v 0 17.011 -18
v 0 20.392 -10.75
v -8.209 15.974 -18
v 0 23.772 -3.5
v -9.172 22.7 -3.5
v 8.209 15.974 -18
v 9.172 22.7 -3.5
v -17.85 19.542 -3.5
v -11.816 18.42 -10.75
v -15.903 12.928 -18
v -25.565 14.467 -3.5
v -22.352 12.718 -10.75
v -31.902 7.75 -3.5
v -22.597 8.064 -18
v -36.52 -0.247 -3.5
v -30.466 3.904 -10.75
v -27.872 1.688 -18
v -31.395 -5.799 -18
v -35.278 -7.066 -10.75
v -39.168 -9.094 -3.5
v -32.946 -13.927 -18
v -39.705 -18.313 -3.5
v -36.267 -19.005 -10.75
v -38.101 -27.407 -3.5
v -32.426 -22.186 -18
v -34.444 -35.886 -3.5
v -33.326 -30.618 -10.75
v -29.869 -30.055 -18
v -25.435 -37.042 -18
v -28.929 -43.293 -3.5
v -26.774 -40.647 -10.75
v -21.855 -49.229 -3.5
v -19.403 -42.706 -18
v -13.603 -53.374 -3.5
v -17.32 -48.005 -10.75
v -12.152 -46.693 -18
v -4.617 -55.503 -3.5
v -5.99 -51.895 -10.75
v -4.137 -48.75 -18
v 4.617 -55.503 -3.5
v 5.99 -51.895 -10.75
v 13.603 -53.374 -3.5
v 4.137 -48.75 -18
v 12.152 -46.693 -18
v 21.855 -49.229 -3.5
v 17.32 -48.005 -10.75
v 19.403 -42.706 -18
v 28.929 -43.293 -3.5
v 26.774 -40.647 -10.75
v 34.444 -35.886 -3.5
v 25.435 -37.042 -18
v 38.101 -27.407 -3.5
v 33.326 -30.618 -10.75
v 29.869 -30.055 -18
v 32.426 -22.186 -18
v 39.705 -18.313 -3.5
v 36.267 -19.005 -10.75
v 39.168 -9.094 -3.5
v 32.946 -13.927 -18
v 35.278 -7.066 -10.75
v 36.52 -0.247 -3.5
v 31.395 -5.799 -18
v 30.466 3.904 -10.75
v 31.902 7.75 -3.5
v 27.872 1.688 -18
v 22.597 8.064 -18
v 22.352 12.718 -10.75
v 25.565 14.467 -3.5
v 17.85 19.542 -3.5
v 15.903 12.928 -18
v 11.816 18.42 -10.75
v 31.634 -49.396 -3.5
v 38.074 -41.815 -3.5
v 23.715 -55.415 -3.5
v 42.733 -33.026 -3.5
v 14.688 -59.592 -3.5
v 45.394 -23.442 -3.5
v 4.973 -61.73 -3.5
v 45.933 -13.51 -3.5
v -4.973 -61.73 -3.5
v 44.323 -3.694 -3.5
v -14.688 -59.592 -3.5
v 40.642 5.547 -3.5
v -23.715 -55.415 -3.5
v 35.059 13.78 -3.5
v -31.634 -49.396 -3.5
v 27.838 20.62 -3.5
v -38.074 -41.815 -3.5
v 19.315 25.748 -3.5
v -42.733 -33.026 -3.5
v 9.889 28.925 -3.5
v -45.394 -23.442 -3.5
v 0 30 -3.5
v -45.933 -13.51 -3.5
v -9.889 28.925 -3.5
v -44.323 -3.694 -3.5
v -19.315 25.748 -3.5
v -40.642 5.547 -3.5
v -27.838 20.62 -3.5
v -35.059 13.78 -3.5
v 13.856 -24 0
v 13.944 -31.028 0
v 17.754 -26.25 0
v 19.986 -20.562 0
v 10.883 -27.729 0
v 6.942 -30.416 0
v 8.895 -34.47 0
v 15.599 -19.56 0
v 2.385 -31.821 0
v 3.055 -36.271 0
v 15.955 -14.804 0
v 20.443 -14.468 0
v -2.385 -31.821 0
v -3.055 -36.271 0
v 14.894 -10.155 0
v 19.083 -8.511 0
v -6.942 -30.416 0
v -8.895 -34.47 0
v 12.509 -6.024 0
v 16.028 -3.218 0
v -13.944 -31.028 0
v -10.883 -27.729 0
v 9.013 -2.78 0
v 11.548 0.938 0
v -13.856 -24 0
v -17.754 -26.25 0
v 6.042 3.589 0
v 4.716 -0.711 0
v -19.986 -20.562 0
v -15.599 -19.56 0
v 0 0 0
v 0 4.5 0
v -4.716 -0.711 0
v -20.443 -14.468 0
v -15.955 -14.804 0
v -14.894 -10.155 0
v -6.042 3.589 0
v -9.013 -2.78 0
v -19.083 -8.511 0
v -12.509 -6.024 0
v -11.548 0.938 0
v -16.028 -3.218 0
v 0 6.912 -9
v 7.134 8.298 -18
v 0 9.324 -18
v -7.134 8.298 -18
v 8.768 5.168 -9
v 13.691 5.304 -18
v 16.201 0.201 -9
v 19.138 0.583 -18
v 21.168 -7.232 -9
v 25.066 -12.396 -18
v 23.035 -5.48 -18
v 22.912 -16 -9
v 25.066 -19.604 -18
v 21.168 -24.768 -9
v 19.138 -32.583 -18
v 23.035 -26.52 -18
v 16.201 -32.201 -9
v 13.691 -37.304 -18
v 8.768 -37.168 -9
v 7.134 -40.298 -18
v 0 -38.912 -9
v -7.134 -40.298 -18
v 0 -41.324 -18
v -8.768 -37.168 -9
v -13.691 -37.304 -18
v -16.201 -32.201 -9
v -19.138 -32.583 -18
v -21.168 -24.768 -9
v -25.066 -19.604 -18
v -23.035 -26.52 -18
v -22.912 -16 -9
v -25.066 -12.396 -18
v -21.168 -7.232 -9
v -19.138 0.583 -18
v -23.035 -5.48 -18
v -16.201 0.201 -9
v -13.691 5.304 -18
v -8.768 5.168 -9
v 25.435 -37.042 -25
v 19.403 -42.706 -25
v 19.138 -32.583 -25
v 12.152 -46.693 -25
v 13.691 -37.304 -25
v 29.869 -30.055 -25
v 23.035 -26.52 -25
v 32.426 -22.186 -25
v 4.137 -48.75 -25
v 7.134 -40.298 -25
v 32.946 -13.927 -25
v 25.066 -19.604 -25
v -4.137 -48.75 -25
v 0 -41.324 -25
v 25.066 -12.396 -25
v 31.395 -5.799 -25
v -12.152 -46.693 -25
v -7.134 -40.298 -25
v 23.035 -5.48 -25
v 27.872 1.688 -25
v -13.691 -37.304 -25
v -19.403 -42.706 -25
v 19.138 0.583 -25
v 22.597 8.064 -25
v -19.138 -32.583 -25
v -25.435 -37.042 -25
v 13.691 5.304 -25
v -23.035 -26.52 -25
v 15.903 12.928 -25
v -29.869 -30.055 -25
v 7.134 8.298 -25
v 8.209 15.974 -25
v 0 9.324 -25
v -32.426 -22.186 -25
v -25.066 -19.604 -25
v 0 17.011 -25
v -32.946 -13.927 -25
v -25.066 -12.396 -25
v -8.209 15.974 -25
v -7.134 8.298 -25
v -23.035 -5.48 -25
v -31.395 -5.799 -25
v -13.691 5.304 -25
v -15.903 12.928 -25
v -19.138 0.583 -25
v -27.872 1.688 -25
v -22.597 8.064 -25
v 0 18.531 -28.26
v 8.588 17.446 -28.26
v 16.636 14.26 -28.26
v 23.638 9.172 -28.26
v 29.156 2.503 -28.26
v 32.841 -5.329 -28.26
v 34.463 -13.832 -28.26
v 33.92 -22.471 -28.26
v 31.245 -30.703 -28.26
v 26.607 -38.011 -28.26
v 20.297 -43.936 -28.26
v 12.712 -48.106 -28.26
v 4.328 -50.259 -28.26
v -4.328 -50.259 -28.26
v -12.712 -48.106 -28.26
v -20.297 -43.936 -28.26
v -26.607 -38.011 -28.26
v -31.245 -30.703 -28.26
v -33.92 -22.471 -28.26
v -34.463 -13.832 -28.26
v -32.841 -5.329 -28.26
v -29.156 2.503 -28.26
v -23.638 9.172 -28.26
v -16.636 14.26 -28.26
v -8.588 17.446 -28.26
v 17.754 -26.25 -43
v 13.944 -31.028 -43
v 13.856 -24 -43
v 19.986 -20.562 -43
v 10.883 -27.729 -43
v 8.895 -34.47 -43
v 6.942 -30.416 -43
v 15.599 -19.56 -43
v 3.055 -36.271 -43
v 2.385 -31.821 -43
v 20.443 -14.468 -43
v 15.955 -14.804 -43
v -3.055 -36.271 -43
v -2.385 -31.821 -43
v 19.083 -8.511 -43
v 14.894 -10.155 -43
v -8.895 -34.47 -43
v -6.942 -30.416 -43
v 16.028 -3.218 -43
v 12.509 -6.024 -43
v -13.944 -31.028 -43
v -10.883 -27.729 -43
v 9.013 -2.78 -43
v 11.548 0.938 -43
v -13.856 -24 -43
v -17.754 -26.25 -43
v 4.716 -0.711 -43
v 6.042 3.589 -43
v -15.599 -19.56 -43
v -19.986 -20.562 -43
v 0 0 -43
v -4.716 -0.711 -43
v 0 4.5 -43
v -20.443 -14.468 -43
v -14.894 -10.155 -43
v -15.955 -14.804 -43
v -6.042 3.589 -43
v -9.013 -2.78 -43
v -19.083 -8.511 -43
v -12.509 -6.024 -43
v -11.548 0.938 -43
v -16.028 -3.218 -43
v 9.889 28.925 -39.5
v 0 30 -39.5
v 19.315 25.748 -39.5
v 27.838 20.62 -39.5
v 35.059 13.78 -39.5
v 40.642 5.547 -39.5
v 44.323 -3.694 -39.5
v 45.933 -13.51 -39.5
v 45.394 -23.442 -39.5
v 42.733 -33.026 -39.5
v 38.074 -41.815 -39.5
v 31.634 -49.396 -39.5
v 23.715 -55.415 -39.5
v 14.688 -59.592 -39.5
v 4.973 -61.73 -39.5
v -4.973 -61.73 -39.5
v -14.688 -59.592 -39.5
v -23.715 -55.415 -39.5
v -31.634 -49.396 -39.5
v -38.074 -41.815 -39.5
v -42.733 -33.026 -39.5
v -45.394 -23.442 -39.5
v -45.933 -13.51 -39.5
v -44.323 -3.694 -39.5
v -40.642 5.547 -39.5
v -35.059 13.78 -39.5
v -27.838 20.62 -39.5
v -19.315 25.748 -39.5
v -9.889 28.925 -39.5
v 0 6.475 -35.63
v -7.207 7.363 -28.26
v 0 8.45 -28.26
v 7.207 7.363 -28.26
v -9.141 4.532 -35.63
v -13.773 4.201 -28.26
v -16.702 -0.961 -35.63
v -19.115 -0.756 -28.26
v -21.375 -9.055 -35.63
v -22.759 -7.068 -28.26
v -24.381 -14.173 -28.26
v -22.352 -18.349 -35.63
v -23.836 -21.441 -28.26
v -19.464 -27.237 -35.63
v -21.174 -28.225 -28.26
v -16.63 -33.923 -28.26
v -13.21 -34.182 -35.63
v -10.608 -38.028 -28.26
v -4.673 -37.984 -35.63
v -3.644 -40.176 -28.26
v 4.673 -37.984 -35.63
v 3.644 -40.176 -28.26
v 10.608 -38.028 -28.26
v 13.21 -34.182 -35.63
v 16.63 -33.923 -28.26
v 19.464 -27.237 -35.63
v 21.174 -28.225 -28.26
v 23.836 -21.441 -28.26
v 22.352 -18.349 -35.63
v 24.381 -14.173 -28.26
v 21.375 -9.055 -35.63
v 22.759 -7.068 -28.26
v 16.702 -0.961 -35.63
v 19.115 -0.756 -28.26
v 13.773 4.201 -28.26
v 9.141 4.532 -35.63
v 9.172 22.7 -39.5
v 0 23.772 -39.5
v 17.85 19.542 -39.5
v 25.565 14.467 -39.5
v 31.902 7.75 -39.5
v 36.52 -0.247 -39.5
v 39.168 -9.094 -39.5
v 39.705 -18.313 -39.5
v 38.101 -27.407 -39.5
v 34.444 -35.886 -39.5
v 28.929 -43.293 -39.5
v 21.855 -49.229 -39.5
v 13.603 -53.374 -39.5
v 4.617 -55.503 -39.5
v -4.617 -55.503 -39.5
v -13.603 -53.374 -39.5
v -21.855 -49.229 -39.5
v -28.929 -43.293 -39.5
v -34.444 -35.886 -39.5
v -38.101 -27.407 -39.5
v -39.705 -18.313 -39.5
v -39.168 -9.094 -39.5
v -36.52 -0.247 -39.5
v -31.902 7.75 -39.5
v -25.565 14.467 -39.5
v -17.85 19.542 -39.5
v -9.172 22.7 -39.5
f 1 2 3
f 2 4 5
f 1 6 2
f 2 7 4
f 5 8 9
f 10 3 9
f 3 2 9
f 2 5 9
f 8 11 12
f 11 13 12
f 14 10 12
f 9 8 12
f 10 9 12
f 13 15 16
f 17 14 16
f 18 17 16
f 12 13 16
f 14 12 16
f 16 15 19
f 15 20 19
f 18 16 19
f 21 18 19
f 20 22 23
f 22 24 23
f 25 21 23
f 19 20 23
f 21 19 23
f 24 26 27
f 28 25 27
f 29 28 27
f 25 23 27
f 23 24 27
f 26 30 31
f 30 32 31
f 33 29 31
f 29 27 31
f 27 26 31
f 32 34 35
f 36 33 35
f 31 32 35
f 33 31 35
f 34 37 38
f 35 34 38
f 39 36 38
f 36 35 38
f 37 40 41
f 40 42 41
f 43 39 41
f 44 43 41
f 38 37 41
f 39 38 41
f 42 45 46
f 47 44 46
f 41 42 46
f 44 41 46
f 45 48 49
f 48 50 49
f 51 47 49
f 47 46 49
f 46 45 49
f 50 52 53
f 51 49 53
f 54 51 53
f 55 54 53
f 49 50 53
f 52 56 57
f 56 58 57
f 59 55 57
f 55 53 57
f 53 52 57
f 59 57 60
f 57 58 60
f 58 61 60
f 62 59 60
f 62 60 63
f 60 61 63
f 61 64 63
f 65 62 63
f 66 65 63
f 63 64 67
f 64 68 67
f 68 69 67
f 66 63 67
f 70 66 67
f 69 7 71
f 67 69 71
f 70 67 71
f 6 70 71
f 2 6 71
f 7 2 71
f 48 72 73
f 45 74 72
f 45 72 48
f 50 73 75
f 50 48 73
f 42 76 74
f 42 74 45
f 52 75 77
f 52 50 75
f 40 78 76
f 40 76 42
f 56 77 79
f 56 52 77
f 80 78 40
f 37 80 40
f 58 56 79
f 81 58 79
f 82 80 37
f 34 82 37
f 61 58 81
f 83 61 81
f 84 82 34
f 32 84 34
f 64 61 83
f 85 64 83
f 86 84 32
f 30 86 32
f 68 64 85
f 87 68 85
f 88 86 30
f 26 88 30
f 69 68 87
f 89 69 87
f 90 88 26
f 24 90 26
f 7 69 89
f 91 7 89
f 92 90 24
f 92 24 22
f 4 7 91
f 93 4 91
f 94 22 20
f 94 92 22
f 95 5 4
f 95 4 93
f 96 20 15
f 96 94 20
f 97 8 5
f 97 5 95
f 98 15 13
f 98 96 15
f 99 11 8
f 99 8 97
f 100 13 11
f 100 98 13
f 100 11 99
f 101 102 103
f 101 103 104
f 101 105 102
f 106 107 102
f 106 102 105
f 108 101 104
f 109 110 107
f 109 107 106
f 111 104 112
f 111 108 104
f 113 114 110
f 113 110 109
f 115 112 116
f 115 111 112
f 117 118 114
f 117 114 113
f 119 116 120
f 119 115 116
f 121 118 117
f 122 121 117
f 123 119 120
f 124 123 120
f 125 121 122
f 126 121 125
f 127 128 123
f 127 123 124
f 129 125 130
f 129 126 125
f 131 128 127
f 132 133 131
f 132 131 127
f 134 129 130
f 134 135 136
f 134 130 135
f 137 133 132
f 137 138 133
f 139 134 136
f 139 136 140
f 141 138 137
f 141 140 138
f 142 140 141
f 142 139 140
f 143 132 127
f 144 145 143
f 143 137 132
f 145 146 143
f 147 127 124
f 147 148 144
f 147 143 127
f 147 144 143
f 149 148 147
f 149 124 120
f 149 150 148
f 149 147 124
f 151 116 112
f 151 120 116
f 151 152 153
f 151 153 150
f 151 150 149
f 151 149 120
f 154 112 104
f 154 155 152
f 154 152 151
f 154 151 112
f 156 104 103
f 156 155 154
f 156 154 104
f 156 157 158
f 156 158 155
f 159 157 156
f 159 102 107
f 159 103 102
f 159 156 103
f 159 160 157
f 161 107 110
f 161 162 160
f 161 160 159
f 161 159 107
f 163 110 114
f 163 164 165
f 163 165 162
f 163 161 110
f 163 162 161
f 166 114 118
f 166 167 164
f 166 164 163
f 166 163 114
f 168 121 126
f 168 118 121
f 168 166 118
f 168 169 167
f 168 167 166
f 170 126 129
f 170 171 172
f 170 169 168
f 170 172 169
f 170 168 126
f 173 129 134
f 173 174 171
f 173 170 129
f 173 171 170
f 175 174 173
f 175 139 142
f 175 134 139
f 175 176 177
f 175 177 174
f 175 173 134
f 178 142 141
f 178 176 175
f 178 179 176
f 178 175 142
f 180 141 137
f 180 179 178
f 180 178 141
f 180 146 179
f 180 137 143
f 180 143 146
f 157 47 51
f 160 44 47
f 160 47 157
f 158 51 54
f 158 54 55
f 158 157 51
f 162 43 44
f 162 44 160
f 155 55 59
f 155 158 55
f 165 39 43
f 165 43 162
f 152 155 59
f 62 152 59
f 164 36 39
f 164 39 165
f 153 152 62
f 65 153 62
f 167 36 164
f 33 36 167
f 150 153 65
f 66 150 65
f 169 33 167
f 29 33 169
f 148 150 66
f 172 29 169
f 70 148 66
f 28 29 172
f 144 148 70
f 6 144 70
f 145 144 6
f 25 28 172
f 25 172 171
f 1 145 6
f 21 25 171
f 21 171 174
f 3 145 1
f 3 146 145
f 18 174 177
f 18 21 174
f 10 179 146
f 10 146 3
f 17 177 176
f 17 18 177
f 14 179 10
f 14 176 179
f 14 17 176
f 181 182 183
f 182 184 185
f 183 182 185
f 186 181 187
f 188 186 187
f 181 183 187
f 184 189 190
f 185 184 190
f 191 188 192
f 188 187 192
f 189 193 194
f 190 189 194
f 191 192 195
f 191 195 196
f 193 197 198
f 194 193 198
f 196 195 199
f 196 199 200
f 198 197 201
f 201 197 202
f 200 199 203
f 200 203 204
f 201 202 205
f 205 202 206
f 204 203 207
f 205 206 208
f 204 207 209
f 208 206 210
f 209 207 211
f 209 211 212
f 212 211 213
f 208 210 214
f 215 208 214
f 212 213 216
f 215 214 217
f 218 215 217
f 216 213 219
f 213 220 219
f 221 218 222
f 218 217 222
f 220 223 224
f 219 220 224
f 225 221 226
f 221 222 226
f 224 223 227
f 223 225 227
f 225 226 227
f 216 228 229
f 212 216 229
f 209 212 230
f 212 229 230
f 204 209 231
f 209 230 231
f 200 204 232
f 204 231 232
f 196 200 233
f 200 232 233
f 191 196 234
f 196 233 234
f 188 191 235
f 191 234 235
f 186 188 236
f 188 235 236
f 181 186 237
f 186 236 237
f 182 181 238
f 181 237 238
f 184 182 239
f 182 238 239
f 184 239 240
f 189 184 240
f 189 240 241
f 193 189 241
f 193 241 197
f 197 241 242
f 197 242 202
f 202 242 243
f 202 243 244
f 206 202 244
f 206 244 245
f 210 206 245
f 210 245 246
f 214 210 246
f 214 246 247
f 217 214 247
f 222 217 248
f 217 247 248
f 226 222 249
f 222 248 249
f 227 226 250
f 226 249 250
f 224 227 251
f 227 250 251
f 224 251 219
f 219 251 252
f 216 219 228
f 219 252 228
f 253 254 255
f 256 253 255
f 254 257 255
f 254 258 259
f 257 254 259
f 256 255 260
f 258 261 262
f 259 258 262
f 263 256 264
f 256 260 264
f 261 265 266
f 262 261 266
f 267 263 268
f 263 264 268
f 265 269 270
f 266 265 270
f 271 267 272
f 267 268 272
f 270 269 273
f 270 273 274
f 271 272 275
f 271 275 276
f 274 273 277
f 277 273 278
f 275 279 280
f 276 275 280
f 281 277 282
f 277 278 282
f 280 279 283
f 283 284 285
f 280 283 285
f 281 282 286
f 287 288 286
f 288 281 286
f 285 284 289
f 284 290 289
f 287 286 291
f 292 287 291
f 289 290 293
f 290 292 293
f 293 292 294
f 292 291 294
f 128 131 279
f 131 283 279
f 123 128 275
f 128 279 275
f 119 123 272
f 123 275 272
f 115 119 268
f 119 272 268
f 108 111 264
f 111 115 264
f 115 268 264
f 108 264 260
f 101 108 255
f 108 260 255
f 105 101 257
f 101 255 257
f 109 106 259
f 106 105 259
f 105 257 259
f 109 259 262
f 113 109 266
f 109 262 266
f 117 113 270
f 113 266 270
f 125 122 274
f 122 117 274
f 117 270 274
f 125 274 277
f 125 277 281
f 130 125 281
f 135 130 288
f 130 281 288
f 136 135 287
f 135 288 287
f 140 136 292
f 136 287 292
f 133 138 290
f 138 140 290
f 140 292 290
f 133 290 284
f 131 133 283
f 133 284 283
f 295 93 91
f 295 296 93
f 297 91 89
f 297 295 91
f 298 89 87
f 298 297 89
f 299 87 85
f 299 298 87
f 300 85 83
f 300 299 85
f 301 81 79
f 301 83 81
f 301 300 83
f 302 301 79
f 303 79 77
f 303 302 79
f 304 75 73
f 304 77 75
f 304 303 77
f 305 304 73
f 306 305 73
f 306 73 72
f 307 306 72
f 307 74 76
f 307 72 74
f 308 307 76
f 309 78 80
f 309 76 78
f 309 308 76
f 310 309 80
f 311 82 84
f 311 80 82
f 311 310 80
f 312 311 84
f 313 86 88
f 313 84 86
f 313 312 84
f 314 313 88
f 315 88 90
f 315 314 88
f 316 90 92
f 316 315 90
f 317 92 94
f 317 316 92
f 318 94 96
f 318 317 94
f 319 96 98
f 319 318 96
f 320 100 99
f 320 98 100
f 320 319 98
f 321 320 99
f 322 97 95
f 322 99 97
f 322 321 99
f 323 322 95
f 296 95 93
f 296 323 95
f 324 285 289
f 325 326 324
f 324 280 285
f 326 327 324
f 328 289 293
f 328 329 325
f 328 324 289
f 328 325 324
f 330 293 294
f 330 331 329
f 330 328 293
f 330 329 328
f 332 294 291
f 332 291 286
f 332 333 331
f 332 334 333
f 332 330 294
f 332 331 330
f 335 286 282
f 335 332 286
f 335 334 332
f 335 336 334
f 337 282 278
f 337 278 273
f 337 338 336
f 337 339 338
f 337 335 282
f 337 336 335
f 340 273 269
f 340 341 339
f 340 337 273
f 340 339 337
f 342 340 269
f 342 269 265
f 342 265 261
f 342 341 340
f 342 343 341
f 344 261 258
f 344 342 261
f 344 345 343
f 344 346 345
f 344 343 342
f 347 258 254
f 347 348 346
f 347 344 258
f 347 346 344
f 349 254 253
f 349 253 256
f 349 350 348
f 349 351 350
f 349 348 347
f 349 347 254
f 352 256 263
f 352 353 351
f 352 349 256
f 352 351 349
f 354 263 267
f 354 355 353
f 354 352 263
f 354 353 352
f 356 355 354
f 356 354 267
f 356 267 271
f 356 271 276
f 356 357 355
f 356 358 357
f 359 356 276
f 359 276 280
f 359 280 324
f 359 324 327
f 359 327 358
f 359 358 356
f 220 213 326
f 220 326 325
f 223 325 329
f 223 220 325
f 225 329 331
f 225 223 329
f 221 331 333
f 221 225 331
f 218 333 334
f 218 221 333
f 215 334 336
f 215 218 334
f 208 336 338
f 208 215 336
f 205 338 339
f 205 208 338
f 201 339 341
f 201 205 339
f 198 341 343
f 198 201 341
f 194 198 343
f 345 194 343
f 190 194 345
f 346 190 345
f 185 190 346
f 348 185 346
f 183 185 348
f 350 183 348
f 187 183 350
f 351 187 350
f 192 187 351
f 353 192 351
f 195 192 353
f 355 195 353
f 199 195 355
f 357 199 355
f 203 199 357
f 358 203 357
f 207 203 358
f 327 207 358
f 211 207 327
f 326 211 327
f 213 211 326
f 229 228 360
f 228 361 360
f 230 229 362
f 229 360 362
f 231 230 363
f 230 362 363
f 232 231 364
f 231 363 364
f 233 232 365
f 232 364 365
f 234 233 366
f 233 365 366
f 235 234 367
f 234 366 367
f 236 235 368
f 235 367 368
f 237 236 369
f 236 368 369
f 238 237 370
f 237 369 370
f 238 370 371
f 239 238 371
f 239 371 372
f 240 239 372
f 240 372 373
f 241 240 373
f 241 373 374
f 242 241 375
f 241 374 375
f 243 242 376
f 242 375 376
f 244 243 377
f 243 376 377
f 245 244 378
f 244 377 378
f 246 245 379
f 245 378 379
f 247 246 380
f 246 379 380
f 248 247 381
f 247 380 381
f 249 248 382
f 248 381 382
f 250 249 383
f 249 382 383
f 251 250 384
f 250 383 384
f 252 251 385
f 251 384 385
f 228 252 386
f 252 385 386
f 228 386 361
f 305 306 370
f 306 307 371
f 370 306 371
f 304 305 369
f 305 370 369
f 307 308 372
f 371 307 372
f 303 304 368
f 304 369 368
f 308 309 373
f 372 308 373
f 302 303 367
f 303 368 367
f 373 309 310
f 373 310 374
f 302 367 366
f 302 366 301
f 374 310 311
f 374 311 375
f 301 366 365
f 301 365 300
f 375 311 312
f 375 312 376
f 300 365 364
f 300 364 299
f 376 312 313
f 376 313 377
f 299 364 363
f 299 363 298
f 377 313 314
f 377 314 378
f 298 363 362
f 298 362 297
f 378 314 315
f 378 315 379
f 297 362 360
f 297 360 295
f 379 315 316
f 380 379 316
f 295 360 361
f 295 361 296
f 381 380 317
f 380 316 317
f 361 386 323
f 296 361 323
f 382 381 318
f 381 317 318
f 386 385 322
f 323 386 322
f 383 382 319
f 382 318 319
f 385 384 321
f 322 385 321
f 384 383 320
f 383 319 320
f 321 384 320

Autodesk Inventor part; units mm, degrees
ref_plane "YZ Plane" through (0, 0, 0) normal (1, 0, 0) x (0, 1, 0)
ref_plane "XZ Plane" through (0, 0, 0) normal (0, 1, 0) x (-1, 0, 0)
ref_plane "XY Plane" through (0, 0, 0) normal (0, 0, 1) x (1, 0, 0)
sketch "Sketch1" plane through (0, 0, 0) normal (1, 0, 0) x (0, 1, 0)
  line L0 (0, 0) -> (0, -43)
  line L1 (0, -43) -> (4.5, -43)
  line L2 (0, 0) -> (4.5, 0)
  line L3 (4.5, 0) -> (0, 0)
  line L4 (0, 0) -> (30, 0)
  line L5 (30, 0) -> (25.5, 0)
  line L6 (25.5, 0) -> (30, 0)
  line L7 (30, 0) -> (30, -3.5)
  line L8 (30, -3.5) -> (30, -39.5)
  line L9 (30, -39.5) -> (30, -43)
  line L10 (23.7723, -3.5) -> (30, -3.5)
  line L11 (30, -39.5) -> (23.7723, -39.5)
  line L12 (23.7723, -39.5) -> (18.5312, -28.2604)
  line L13 (23.7723, -39.5) -> (36.1738, -39.5) construction
  line L14 (4.5, -43) -> (8.4495, -28.2604)
  line L15 (4.5, -43) -> (19.7596, -43) construction
  line L16 (0, 0) -> (0, -21.5)
  line L17 (0, -21.5) -> (30, -21.5)
  line L18 (18.5312, -28.2604) -> (17.0108, -25)
  line L19 (0, -21.5) -> (0, -21.5)
  line L20 (0, -21.5) -> (0, -25)
  line L21 (0, -25) -> (0, -18)
  line L22 (9.3236, -25) -> (17.0108, -25)
  line L23 (23.7723, -3.5) -> (17.0108, -18)
  line L24 (17.0108, -18) -> (9.3236, -18)
  line L25 (9.3236, -18) -> (4.5, 0)
  line L26 (9.3236, -25) -> (8.2254, -29.0967)
  line L27 (0, -43) -> (-16, -43)
  line L28 (-16, -43) -> (-16, -23.25)
  dimension "d0" = 43
  dimension "d1" = 4.5
  dimension "d2" = 4.5
  dimension "d3" = 30
  dimension "d4" = 4.5
  dimension "d5" = 3.5
  dimension "d6" = 36
  dimension "d7" = 3.5
  dimension "d8" = 115
  dimension "d9" = 75
  dimension "d11" = 21.5
  dimension "d12" = 0
  dimension "d13" = 3.5
  dimension "d14" = 7
  dimension "d29" = 25
  dimension "d30" = 25
  dimension "d31" = 15.006
  dimension "d32" = 15.001
  dimension "d33" = 14.5
  dimension "d34" = 3.5
  dimension "d35" = 4.8516
  dimension "d36" = 23.0242
  dimension "d37" = 15.4786
  dimension "d38" = 6.1738
  dimension "d39" = 10.2404
  dimension "d40" = 16
sketch "Sketch2" plane through (0, 0, 0) normal (0, 1, 0) x (-1, 0, 0)
  point P0 (0, 0)
sketch "Sketch3" plane through (0, 0, 0) normal (1, 0, 0) x (0, 1, 0)
  line L0 (-16, -42.9893) -> (-16, -42.9893)
  line L1 (0, 0) -> (0, -42.9893)
  line L2 (0, -42.9893) -> (-16, -42.9893)
  dimension "d16" = 0
sketch "Sketch4" plane through (0, 0, 0) normal (1, 0, 0) x (0, 1, 0)
  line L0 (-16, 5.5421) -> (-16, 5.5421)
  line L1 (-16, -17.3048) -> (-16, -42.7531)
  point P0 (0, 0)
  dimension "d17" = 0
revolve "Revolution1" add sketch "Sketch1" angle 360 about axis through (0, -16, -43) along (0, 0, 1) contours L2 L25 L24 L23 L10 L8 L17 L0 | L17 L8 L11 L12 L18 L22 L26 L14 L1 L0
properties material "Iron, Cast"
